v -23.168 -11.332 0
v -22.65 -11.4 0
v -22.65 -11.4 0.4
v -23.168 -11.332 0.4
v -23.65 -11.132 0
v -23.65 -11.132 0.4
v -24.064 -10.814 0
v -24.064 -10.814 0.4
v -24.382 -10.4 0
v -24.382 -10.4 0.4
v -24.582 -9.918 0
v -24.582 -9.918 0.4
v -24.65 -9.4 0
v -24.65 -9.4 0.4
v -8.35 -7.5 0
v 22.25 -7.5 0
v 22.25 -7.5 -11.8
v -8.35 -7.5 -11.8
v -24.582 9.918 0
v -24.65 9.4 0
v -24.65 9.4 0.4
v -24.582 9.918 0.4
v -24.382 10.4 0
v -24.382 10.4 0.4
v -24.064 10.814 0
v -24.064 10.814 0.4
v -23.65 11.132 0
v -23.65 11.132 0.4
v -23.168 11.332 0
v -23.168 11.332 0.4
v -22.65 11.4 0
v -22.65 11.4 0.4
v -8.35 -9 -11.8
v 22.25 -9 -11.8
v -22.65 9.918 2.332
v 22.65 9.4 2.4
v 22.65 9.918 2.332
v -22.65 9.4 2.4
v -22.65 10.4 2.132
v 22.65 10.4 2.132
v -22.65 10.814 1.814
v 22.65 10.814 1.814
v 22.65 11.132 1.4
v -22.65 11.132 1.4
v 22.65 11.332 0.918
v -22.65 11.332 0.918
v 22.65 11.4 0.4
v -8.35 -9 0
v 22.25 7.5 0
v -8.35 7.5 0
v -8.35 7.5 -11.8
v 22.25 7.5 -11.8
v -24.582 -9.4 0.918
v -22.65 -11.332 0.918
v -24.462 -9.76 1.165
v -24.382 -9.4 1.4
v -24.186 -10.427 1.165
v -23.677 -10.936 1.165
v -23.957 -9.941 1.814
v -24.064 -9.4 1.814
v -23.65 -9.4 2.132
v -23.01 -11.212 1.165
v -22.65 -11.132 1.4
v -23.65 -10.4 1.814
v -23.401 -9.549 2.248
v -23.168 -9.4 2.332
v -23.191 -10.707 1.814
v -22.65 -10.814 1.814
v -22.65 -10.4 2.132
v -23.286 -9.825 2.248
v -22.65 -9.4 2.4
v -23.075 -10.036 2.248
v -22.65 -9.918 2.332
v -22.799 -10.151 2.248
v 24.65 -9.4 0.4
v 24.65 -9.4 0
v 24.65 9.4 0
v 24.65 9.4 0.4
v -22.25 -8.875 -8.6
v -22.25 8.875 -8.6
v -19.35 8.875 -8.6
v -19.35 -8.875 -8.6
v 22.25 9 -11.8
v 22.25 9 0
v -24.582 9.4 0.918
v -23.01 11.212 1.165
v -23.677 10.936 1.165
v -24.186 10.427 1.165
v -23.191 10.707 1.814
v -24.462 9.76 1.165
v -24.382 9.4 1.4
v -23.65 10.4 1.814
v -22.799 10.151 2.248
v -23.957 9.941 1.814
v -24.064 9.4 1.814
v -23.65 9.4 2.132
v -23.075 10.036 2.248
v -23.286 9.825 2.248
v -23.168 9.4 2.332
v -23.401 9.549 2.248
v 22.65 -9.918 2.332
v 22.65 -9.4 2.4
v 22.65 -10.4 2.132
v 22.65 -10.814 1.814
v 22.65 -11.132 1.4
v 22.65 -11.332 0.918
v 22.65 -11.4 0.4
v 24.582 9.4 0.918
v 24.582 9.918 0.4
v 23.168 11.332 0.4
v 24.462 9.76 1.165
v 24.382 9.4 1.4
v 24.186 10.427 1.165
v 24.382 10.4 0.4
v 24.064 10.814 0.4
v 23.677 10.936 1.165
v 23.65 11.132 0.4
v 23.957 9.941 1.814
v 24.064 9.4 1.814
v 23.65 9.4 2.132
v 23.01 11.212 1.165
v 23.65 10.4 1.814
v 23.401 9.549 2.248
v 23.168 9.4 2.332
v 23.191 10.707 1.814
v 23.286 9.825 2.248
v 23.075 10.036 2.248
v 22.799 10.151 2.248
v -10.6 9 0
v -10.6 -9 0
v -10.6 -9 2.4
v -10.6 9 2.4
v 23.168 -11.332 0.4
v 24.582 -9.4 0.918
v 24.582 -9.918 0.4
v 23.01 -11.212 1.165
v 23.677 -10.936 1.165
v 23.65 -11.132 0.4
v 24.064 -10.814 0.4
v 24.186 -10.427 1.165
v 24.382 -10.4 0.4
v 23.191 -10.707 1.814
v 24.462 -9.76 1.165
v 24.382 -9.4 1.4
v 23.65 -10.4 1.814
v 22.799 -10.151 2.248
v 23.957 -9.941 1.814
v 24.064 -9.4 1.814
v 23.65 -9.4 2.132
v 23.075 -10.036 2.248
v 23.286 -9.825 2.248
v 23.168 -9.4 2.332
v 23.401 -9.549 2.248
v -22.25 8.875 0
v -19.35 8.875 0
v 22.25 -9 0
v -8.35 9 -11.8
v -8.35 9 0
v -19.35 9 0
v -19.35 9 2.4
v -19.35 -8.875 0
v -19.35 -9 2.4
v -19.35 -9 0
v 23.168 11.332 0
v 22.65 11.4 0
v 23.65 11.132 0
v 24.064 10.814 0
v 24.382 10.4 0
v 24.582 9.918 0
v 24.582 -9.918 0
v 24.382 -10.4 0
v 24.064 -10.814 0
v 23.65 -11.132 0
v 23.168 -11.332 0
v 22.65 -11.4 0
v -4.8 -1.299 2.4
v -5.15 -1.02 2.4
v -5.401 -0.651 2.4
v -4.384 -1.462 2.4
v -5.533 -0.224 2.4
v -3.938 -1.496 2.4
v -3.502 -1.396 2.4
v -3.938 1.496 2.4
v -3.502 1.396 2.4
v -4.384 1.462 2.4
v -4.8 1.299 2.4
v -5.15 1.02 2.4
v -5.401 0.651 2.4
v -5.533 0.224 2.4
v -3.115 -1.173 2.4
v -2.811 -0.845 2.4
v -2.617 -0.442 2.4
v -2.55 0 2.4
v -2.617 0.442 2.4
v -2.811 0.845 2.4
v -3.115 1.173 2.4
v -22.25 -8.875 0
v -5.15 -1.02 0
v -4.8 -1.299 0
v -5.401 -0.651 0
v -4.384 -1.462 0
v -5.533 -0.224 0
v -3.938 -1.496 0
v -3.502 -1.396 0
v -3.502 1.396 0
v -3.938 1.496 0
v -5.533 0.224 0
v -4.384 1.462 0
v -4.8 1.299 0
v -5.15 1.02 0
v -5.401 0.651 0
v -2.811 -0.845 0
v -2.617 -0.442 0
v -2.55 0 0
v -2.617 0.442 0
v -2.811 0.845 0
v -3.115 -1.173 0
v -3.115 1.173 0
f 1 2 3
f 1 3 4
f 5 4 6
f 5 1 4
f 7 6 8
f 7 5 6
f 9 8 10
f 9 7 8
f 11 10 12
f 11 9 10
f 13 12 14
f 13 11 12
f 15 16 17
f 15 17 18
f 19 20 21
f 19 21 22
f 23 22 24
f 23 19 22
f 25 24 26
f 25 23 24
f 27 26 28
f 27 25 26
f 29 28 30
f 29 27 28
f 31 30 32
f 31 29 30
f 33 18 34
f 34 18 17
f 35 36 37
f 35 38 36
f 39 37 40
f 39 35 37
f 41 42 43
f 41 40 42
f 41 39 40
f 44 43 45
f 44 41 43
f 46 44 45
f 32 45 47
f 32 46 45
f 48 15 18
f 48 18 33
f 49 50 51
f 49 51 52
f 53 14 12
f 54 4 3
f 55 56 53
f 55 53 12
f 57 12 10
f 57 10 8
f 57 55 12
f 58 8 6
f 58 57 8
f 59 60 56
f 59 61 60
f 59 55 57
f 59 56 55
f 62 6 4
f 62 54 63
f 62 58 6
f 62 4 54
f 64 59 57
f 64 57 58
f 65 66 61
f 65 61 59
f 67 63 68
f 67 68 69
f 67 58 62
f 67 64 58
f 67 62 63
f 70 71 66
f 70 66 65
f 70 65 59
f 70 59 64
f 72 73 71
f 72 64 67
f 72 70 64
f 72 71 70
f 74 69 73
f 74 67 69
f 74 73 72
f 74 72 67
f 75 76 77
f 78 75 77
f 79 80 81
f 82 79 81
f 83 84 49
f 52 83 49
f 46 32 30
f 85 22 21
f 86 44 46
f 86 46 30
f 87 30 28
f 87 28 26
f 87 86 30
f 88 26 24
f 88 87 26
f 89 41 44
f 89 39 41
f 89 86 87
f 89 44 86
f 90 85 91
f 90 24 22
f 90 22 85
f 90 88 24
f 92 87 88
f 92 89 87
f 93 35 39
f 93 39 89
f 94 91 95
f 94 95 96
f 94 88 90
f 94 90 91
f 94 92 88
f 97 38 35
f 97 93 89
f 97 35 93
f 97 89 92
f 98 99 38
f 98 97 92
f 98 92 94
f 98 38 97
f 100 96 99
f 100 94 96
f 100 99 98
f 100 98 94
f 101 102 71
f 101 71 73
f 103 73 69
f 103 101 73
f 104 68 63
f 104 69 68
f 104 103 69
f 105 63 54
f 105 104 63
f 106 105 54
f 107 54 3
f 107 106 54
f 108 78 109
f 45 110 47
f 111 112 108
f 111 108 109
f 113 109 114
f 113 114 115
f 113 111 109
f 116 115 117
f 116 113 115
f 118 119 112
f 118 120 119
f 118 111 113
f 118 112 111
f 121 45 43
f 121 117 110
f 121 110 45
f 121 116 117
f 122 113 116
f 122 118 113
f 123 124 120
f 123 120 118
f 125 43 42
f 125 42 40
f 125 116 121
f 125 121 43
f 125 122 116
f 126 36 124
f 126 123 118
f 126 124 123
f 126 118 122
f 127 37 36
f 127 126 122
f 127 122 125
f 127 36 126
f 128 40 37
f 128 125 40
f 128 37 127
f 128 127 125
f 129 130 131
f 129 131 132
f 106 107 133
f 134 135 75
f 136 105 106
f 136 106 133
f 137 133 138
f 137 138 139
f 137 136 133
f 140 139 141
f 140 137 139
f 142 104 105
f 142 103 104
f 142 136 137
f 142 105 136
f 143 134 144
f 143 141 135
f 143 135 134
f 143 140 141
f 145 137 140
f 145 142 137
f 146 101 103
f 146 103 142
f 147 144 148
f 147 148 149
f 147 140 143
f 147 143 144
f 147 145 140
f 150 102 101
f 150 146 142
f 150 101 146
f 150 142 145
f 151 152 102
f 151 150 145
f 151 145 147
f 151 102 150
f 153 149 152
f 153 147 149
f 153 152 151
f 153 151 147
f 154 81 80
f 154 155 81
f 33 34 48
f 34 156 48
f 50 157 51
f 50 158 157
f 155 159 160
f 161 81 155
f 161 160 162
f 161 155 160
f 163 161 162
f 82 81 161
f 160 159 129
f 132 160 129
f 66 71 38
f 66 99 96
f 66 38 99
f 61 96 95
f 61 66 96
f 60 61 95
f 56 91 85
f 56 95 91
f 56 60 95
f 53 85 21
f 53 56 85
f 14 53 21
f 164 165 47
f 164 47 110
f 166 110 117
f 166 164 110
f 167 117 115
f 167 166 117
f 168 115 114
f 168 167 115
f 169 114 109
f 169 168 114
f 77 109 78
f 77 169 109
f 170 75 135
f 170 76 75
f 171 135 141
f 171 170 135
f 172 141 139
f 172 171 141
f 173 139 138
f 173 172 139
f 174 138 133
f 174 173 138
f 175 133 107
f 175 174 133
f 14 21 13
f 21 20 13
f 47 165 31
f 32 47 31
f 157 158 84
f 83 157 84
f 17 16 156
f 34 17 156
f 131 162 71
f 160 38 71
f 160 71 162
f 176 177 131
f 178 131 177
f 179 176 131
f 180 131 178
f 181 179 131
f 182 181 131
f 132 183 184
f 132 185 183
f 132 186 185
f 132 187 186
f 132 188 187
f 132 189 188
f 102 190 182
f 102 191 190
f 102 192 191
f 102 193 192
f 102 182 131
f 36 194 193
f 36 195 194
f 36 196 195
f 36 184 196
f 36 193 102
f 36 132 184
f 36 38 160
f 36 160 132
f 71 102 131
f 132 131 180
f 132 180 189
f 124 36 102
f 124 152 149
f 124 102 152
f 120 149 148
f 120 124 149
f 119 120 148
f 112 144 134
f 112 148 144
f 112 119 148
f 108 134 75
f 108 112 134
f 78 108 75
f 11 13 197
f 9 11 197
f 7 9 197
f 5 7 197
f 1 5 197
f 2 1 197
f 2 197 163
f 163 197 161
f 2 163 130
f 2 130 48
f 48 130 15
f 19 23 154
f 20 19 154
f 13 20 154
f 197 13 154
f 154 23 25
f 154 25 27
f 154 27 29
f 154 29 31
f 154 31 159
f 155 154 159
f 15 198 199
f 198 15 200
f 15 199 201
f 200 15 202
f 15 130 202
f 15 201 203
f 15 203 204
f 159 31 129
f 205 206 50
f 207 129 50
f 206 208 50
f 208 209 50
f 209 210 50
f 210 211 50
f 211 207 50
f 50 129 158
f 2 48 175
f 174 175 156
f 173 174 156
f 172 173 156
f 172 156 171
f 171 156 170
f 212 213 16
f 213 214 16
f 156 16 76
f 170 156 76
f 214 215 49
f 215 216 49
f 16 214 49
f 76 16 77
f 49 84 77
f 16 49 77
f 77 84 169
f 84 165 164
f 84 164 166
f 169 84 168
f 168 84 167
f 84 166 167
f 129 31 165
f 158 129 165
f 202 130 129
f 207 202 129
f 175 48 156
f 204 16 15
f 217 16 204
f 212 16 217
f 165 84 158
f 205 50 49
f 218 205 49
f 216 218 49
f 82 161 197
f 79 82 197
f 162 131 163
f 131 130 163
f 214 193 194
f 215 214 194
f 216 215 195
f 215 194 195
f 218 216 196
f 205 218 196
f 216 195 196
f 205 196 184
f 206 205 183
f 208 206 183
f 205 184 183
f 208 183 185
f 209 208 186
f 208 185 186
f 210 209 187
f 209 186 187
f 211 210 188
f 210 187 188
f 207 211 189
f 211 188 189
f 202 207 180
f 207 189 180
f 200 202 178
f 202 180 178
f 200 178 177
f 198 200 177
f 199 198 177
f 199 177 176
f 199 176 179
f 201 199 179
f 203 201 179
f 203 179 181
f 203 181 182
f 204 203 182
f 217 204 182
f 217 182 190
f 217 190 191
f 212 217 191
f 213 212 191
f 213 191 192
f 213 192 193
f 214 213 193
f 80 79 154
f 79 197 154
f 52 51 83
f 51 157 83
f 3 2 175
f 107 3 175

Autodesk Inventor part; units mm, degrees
ref_plane "YZ Plane" through (0, 0, 0) normal (1, 0, 0) x (0, 1, 0)
ref_plane "XZ Plane" through (0, 0, 0) normal (0, 1, 0) x (-1, 0, 0)
ref_plane "Work Plane1" through (0, 0, 0) normal (0, 0, 1) x (1, 0, 0)
sketch "Sketch1" plane through (0, 0, 0) normal (0, 0, 1) x (1, 0, 0)
  arc A0 (-22.65, 11.4) -> (-24.65, 9.4) centre (-22.65, 9.4) ccw projected
  line L0 (-24.65, 9.4) -> (-24.65, -9.4) projected
  arc A1 (-24.65, -9.4) -> (-22.65, -11.4) centre (-22.65, -9.4) ccw projected
  line L1 (-22.65, -11.4) -> (22.65, -11.4) projected
  arc A2 (22.65, -11.4) -> (24.65, -9.4) centre (22.65, -9.4) ccw projected
  line L2 (24.65, -9.4) -> (24.65, 9.4) projected
  arc A3 (24.65, 9.4) -> (22.65, 11.4) centre (22.65, 9.4) ccw projected
  line L3 (22.65, 11.4) -> (-22.65, 11.4) projected
  line L4 (22.25, 9) -> (22.25, -9) projected
  line L5 (22.25, -9) -> (-8.35, -9) projected
  line L6 (-8.35, -2.5) -> (-8.35, -9) projected
  line L7 (-10.6, -2.5) -> (-8.35, -2.5) projected
  line L8 (-10.6, -9) -> (-10.6, -2.5) projected
  line L9 (-10.6, -9) -> (-22.25, -9) projected
  line L10 (-22.25, -9) -> (-22.25, 9) projected
  line L11 (-22.25, 9) -> (-10.6, 9) projected
  line L12 (-10.6, 2.5) -> (-10.6, 9) projected
  line L13 (-8.35, 2.5) -> (-10.6, 2.5) projected
  line L14 (-8.35, 9) -> (-8.35, 2.5) projected
  line L15 (-8.35, 9) -> (22.25, 9) projected
  line L16 (-20.5, -9) -> (-20.5, -4.5) projected
  line L17 (-20.5, 4.5) -> (-20.5, 9) projected
  line L18 (-20.5, -4.5) -> (-20.5, 4.5)
  line L19 (-10.6, -2.5) -> (-10.6, 2.5)
  line L20 (22.25, -7.5) -> (-8.35, -7.5)
  line L21 (-8.35, 7.5) -> (22.25, 7.5)
  point P0 (0, 0)
  dimension "d0" = 1.5
  dimension "d1" = 1.5
ref_plane "Work Plane2" through (0, 0, -11.8) normal (0, 0, 1) x (1, 0, 0)
extrude "Extrusion1" add sketch "Sketch1" against normal up to surface (11.8 mm away) contours L4 L21 L14 L15 | L4 L5 L6 L20
ref_plane "Work Plane3" through (0, 0, 0) normal (0, 0, 1) x (1, 0, 0)
sketch "Sketch2" plane through (0, 0, 0) normal (0, 0, 1) x (1, 0, 0)
  line L0 (-22.25, -9) -> (-22.25, 9) projected
  line L1 (-10.6, -9) -> (-10.6, -2.5) projected
  line L2 (-10.6, 2.5) -> (-10.6, 9) projected
  line L3 (-10.6, -2.5) -> (-10.6, 2.5)
  line L4 (-10.6, -8.875) -> (-19.35, -8.875)
  line L5 (-19.35, -8.875) -> (-19.35, 8.875)
  line L6 (-19.35, 8.875) -> (-10.6, 8.875)
  line L7 (-10.6, 8.875) -> (-10.6, -8.875)
  line L8 (-19.35, -8.875) -> (-22.25, -8.875)
  line L9 (-19.35, 8.875) -> (-22.25, 8.875)
  point P0 (0, 0)
  point P1 (-10.6, 0)
  dimension "d4" = 17.75
  dimension "d5" = 8.75
ref_plane "Work Plane4" through (-22.25, -9, -8.6) normal (0, 0, 1) x (1, 0, 0)
extrude "Extrusion2" add sketch "Sketch2" against normal up to surface (8.6 mm away) contours L0 L9 L5 L8
sketch "Sketch3" plane through (0, 0, 0) normal (0, 0, 1) x (1, 0, 0)
  arc A0 (-22.65, 11.4) -> (-24.65, 9.4) centre (-22.65, 9.4) ccw projected
  line L0 (-24.65, 9.4) -> (-24.65, -9.4) projected
  arc A1 (-24.65, -9.4) -> (-22.65, -11.4) centre (-22.65, -9.4) ccw projected
  line L1 (-22.65, -11.4) -> (22.65, -11.4) projected
  arc A2 (22.65, -11.4) -> (24.65, -9.4) centre (22.65, -9.4) ccw projected
  line L2 (24.65, -9.4) -> (24.65, 9.4) projected
  arc A3 (24.65, 9.4) -> (22.65, 11.4) centre (22.65, 9.4) ccw projected
  line L3 (22.65, 11.4) -> (-22.65, 11.4) projected
  line L4 (22.25, 9) -> (22.25, -9) projected
  line L5 (22.25, -9) -> (-8.35, -9) projected
  line L6 (-8.35, -2.5) -> (-8.35, -9) projected
  line L7 (-10.6, -2.5) -> (-8.35, -2.5) projected
  line L8 (-10.6, -9) -> (-10.6, -2.5) projected
  line L9 (-10.6, -9) -> (-22.25, -9) projected
  line L10 (-22.25, -9) -> (-22.25, 9) projected
  line L11 (-22.25, 9) -> (-10.6, 9) projected
  line L12 (-10.6, 2.5) -> (-10.6, 9) projected
  line L13 (-8.35, 2.5) -> (-10.6, 2.5) projected
  line L14 (-8.35, 9) -> (-8.35, 2.5) projected
  line L15 (-8.35, 9) -> (22.25, 9) projected
  line L16 (-19.35, -8.875) -> (-19.35, 8.875) projected
  line L17 (-19.35, -9) -> (-10.6, -9)
  line L18 (-10.6, -9) -> (-10.6, 9)
  line L19 (-10.6, 9) -> (-19.35, 9)
  line L20 (-19.35, 9) -> (-19.35, -9)
  point P0 (0, 0)
  point P1 (-19.35, 0)
extrude "Extrusion3" add sketch "Sketch3" along normal blind 2.4 contours L3 A3 L2 A2 L1 A1 L0 A0 | L4 L5 L6 L7 L18 L13 L14 L15 | L20 L16 L9 L10 L11
fillet "Fillet1" radius 2 8 edges at (-24.0642, 10.8142, 2.4) (-24.65, 0, 2.4) (-24.0642, -10.8142, 2.4) (0, -11.4, 2.4) (24.0642, -10.8142, 2.4) (24.65, 0, 2.4) (24.0642, 10.8142, 2.4) (0, 11.4, 2.4)
sketch "Sketch4" plane through (0, 0, 2.4) normal (0, 0, 1) x (1, 0, 0)
  line L0 (22.25, 9) -> (22.25, -9) projected
  line L1 (22.25, -9) -> (-8.35, -9) projected
  line L2 (-8.35, -2.5) -> (-8.35, -9) projected
  circle A0 centre (-4.05, 0) radius 1.5
  line L3 (22.25, 0) -> (28.5402, 0) construction
  point P0 (0, 0)
  dimension "d11" = 3
  dimension "d12" = 4.3
extrude "Extrusion4" cut sketch "Sketch4" against normal up to surface (2.4 mm away)
equation "\"d1\" = d0"
properties part number "rf_tester_top"
